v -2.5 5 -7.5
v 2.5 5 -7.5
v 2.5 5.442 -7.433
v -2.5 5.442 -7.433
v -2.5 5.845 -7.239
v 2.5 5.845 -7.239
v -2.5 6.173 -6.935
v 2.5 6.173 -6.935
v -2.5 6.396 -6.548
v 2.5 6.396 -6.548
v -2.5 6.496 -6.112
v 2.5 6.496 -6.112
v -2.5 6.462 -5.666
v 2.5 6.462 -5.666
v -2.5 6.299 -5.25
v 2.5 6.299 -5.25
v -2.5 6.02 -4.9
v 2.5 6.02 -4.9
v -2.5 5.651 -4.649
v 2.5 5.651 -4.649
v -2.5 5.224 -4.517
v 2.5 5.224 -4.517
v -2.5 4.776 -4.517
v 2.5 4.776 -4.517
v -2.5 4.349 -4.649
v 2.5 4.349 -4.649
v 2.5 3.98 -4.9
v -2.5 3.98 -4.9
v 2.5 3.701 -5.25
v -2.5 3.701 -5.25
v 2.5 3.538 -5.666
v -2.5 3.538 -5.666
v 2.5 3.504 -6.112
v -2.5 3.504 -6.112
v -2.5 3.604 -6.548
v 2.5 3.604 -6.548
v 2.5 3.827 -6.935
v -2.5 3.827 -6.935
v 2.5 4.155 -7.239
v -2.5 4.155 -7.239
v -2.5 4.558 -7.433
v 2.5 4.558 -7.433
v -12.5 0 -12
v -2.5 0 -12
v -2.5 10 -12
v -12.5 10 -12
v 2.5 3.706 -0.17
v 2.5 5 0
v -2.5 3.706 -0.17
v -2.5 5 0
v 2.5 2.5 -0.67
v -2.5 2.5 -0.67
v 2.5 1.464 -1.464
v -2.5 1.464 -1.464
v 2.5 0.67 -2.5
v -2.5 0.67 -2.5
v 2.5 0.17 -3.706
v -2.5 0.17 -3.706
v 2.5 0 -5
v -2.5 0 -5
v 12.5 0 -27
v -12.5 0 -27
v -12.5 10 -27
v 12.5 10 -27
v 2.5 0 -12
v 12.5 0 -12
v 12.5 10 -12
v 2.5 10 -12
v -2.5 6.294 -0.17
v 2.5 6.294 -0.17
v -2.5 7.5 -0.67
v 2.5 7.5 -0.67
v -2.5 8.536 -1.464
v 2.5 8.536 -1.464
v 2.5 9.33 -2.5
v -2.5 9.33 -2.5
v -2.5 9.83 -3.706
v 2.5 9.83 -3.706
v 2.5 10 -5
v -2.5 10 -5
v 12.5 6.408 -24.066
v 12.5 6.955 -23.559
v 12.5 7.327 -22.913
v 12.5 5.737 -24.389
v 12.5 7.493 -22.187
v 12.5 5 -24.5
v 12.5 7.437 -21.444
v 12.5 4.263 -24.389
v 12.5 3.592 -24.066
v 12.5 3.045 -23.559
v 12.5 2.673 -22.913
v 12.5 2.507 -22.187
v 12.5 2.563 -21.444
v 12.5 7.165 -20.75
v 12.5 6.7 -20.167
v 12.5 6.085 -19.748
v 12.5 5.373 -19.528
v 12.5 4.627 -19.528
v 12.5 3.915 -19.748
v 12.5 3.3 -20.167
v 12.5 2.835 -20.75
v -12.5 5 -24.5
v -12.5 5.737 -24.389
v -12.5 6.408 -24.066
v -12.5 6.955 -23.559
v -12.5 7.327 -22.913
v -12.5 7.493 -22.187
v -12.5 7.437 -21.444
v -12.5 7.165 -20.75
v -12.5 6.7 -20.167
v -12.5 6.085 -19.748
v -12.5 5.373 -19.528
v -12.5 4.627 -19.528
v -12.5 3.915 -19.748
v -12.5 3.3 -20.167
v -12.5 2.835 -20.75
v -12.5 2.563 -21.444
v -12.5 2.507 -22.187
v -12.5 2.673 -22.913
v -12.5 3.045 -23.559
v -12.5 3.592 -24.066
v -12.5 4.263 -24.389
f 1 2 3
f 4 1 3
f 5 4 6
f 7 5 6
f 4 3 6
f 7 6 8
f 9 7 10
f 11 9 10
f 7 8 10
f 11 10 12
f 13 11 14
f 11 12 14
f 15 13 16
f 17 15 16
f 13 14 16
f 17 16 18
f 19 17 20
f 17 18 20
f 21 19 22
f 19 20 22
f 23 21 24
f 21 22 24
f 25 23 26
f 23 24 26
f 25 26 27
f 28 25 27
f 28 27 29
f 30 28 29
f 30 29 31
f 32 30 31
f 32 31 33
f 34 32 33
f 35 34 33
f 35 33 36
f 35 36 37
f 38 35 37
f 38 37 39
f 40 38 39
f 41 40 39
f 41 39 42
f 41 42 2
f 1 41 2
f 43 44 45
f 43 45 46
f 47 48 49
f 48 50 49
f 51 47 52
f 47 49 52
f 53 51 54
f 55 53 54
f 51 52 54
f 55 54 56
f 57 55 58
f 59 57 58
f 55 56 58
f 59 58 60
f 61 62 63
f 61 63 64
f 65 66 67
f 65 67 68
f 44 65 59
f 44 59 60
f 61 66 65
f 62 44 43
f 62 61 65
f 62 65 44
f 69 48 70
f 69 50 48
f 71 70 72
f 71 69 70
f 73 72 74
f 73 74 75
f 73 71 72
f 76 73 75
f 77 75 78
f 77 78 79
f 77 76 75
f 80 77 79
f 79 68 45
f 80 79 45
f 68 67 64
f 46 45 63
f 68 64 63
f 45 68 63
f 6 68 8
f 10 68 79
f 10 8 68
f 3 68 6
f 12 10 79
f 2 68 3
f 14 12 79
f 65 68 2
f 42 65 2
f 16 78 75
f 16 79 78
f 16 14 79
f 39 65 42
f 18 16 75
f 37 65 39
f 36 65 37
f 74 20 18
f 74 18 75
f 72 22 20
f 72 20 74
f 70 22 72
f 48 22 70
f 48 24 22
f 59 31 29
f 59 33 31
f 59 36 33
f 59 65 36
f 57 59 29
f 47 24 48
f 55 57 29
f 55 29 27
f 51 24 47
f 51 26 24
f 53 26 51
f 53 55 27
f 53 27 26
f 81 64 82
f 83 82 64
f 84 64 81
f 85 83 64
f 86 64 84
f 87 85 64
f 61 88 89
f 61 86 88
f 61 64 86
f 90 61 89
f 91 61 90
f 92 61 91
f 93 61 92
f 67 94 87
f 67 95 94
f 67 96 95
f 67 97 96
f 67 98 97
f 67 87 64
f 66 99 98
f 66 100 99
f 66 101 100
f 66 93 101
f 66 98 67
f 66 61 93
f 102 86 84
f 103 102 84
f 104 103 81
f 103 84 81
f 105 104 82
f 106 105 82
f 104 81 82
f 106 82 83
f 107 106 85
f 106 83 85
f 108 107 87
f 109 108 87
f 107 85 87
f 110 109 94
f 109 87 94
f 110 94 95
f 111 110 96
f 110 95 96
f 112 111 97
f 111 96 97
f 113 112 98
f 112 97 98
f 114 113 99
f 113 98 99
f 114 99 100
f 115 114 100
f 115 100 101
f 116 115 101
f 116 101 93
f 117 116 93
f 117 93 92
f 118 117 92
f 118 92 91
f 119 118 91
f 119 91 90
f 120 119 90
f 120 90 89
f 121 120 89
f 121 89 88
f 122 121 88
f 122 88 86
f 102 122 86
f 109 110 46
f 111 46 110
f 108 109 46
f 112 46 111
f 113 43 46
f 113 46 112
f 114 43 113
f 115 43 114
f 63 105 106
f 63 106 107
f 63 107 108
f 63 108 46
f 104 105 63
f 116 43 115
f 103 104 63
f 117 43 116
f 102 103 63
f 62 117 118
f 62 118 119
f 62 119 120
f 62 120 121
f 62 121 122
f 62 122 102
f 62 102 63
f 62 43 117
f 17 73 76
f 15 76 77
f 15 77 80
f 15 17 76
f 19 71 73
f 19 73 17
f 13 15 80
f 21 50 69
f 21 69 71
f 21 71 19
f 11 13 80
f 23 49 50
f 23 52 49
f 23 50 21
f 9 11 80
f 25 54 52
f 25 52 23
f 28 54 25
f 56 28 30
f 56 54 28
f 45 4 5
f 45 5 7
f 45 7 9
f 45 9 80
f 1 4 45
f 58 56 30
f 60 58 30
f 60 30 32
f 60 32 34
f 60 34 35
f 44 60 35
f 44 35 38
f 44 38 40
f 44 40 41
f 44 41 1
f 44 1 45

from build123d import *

# Parameters (mm, degrees)
BOSS_EXTRUDE1_DEPTH = 10
SKETCH2_R           = 2.5
SKETCH2_R_2         = 1.5
CUT_EXTRUDE1_DEPTH  = 39.13135193
FILLET1_R           = 5


with BuildPart() as part:
    # Sketch1 → Boss-Extrude1 (new body)
    with BuildSketch(Plane(origin=(0, 0, 0), x_dir=(1, 0, 0), z_dir=(0, 1, 0))):
        Polygon((2.5, 0), (-2.5, 0), (-2.5, 12), (-12.5, 12), (-12.5, 27), (12.5, 27), (12.5, 12), (2.5, 12), align=None)
    extrude(amount=BOSS_EXTRUDE1_DEPTH)

    # Sketch2 → Cut-Extrude1 (cut, through all)
    with BuildSketch(Plane(origin=(12.5, 0, 0), x_dir=(0, 0, -1), z_dir=(1, 0, 0))):
        with Locations((22, 5)):
            Circle(SKETCH2_R)
        with Locations((6, 5)):
            Circle(SKETCH2_R_2)
    extrude(amount=-CUT_EXTRUDE1_DEPTH, mode=Mode.SUBTRACT)

    # Fillet1
    fillet1_edges = [part.edges().sort_by_distance(p)[0] for p in [
        (0, 10, 0),
        (0, 0, 0),
    ]]
    fillet(fillet1_edges, radius=FILLET1_R - 0.0001)  # a hair under: the kernel refuses the full size


solid = part.part
